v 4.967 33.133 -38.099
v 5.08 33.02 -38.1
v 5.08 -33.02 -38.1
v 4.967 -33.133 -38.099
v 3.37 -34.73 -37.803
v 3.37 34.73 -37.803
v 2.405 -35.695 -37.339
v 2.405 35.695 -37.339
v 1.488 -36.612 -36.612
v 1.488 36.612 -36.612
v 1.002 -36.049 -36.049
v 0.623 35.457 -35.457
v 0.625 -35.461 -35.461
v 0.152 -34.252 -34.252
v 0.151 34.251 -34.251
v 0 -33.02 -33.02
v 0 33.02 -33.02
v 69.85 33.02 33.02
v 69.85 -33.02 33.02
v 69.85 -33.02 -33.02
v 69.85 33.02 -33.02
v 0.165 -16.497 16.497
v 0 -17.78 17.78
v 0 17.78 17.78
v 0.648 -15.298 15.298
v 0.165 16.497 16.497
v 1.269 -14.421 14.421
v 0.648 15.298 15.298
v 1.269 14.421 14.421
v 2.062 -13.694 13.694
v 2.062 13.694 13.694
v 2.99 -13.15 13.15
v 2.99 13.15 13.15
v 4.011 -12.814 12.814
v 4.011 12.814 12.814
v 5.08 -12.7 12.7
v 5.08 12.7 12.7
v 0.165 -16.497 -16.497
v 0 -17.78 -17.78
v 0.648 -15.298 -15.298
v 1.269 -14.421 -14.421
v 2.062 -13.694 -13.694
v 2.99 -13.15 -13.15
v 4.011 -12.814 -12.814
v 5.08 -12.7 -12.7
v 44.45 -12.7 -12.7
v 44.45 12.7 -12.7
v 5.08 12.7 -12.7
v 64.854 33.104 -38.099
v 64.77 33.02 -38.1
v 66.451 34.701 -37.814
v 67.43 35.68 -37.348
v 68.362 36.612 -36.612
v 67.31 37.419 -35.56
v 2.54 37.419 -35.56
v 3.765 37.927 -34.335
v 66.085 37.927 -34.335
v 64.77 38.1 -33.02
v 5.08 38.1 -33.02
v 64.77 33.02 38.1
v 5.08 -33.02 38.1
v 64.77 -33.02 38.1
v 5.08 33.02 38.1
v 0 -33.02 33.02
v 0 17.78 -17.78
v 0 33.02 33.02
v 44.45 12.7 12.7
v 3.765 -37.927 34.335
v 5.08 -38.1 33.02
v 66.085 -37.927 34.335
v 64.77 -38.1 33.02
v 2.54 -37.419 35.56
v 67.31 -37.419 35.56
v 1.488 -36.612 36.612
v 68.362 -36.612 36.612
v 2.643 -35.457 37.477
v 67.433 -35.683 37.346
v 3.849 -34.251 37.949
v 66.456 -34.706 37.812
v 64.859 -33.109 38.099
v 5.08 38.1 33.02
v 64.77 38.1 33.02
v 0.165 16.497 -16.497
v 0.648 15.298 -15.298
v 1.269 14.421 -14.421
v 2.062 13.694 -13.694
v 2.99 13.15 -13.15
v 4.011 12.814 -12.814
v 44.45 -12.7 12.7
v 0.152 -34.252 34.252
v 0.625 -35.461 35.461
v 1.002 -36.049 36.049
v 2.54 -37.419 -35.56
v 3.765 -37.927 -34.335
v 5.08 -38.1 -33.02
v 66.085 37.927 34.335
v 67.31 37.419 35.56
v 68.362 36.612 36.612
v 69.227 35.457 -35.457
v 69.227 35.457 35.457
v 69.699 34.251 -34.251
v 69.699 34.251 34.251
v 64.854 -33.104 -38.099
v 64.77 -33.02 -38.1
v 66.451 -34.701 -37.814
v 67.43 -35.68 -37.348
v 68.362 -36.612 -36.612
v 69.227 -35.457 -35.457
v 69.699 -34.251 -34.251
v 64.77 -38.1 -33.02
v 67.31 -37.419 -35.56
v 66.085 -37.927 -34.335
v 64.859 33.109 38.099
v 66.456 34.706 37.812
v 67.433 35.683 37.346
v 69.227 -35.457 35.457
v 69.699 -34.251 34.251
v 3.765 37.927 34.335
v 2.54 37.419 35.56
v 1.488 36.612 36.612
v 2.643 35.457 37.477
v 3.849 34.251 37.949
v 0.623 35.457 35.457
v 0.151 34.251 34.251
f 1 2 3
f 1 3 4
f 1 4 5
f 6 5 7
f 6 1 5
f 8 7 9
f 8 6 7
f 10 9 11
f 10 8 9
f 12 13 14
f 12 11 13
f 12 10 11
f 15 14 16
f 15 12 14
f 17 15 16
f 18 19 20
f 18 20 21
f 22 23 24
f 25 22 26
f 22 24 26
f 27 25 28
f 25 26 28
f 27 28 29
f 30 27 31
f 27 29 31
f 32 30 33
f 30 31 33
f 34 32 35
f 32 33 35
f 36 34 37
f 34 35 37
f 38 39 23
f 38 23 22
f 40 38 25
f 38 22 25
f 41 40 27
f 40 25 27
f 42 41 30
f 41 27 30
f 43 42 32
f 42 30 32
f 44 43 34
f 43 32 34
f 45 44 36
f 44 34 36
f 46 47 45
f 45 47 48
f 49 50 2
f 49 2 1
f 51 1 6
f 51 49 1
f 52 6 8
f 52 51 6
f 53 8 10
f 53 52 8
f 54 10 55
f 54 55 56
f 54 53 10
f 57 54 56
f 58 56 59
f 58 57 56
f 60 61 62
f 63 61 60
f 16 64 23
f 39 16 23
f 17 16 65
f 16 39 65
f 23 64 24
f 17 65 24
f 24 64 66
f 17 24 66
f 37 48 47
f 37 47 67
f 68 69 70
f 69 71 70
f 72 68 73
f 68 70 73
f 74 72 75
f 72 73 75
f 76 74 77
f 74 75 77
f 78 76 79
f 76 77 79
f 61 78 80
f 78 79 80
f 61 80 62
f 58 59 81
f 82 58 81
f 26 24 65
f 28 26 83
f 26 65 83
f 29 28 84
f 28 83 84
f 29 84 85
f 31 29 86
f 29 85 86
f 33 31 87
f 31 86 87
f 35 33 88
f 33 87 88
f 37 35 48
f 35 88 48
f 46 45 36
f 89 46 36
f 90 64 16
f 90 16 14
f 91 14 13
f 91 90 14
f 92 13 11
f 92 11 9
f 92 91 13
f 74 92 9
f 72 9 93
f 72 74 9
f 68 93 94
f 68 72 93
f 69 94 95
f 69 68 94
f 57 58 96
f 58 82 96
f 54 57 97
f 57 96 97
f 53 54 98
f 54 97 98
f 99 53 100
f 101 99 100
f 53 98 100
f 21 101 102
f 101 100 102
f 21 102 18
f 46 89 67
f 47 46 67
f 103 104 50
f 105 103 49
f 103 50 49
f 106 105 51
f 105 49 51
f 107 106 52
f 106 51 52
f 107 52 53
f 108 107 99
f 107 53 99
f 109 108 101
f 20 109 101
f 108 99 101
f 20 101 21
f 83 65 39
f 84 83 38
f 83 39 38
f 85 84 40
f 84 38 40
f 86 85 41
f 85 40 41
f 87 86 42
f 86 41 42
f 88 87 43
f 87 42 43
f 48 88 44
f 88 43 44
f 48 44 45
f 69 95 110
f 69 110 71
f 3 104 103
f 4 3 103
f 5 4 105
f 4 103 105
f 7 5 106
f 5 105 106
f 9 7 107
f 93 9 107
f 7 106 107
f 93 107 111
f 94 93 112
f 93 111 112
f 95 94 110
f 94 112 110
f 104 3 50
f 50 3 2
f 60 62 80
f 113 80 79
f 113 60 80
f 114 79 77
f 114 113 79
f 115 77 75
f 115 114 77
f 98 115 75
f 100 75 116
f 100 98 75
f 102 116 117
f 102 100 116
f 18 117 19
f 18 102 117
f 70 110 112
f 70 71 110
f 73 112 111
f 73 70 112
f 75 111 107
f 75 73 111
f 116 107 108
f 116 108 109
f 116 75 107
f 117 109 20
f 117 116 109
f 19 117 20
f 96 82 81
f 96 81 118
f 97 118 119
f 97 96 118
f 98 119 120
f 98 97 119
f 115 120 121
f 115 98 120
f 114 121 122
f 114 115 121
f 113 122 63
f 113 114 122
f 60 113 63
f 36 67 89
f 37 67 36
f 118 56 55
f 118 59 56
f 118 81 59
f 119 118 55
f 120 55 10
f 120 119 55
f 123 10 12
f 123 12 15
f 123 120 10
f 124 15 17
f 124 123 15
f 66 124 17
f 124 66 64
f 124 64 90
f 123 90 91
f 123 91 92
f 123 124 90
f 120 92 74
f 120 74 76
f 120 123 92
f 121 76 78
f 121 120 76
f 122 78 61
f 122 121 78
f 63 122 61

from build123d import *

# Parameters (mm, degrees)
F0_W         = 76.2
F0_H         = 76.2
F1_DEPTH     = 69.85
F2_T         = -25.4
F3_R         = 5.08
F4_R         = 5.08
F5_T1_DEPTH  = 91.44
F5_T3_DEPTH  = 25.4
F5_T5_DEPTH  = 25.4
F5_T11_DEPTH = 38.1
F5_T15_DEPTH = 38.1
F5_T22_DEPTH = 38.1
F5_T26_DEPTH = 38.1
F5_T33_DEPTH = 38.1
F5_T37_DEPTH = 38.1
F5_T44_DEPTH = 38.1
F5_T48_DEPTH = 38.1
F6_T1_DEPTH  = 91.44


# Not quite as in the source:
# - a fillet or chamfer that OpenCascade refuses, or shapes differently, is made with other operations: its cross-section is extruded or revolved along the edge and cut away or added


with BuildPart() as f1:
    # F0 (on Right) → F1 (new body)
    with BuildSketch(Plane.YZ):
        Rectangle(F0_W, F0_H)
    extrude(amount=F1_DEPTH)

    # F2
    f2_openings = [f1.faces().sort_by_distance(p)[0] for p in [
        (0, 0, 0),
    ]]
    offset(amount=F2_T, openings=f2_openings)

    # F3
    f3_edges = [f1.edges().sort_by_distance(p)[0] for p in [
        (34.925, 38.1, -38.1),
        (34.925, 38.1, 38.1),
        (0, 38.1, 0),
        (69.85, 38.1, 0),
    ]]
    fillet(f3_edges, radius=F3_R)

    # F4
    f4_edges = [f1.edges().sort_by_distance(p)[0] for p in [
        (34.925, -38.1, 38.1),
        (34.925, -38.1, -38.1),
        (0, -38.1, 0),
        (69.85, -38.1, 0),
    ]]
    fillet(f4_edges, radius=F4_R)

    # F5: fillet of radius 5.08 on 8 edges, made by hand

    # F5_s2 → F5_t1 (cut)
    with BuildSketch(Plane.XZ.offset(-45.72)):
        with BuildLine():
            ThreePointArc((5.08, -38.1), (1.4878975516, -36.6121024484), (0, -33.02))
            Line((0, -33.02), (0, -38.1))
            Line((0, -38.1), (5.08, -38.1))
        make_face()
        with BuildLine():
            ThreePointArc((0, 33.02), (1.4878975516, 36.6121024484), (5.08, 38.1))
            Line((5.08, 38.1), (0, 38.1))
            Line((0, 38.1), (0, 33.02))
        make_face()
    extrude(amount=F5_T1_DEPTH, mode=Mode.SUBTRACT)

    # F5_s4 → F5_t3 (cut)
    with BuildSketch(Plane.XY.offset(-12.7)):
        with BuildLine():
            ThreePointArc((0, -17.78), (1.4878975516, -14.1878975516), (5.08, -12.7))
            Line((5.08, -12.7), (0, -12.7))
            Line((0, -12.7), (0, -17.78))
        make_face()
        with BuildLine():
            ThreePointArc((0, 17.78), (1.4878975516, 14.1878975516), (5.08, 12.7))
            Line((5.08, 12.7), (0, 12.7))
            Line((0, 12.7), (0, 17.78))
        make_face()
    extrude(amount=F5_T3_DEPTH, mode=Mode.SUBTRACT)

    # F5_s6 → F5_t5 (cut)
    with BuildSketch(Plane.XZ.offset(-12.7)):
        with BuildLine():
            ThreePointArc((0, 17.78), (1.4878975516, 14.1878975516), (5.08, 12.7))
            Line((5.08, 12.7), (0, 12.7))
            Line((0, 12.7), (0, 17.78))
        make_face()
        with BuildLine():
            ThreePointArc((0, -17.78), (1.4878975516, -14.1878975516), (5.08, -12.7))
            Line((5.08, -12.7), (0, -12.7))
            Line((0, -12.7), (0, -17.78))
        make_face()
    extrude(amount=F5_T5_DEPTH, mode=Mode.SUBTRACT)


with BuildPart() as f5_tool9:
    # F5_s10 → F5_t11 (new body)
    with BuildSketch(Plane.XY.offset(25.4)):
        with BuildLine():
            ThreePointArc((0, -17.78), (1.4878975516, -14.1878975516), (5.08, -12.7))
            Line((5.08, -12.7), (0, -12.7))
            Line((0, -12.7), (0, -17.78))
        make_face()
    extrude(amount=-F5_T11_DEPTH)

    split(bisect_by=Plane.XY.offset(12.7), keep=Keep.TOP)


with BuildPart() as f5_tool13:
    # F5_s14 → F5_t15 (new body)
    with BuildSketch(Plane.XZ.offset(-12.7)):
        with BuildLine():
            ThreePointArc((0, 17.78), (1.4878975516, 14.1878975516), (5.08, 12.7))
            Line((5.08, 12.7), (0, 12.7))
            Line((0, 12.7), (0, 17.78))
        make_face()
    extrude(amount=F5_T15_DEPTH)

    split(bisect_by=Plane.XZ.offset(12.7), keep=Keep.TOP)


with BuildPart() as f5_tool9_1:
    add(f5_tool9.part)

    # F5_t17: intersect F5_tool13
    add(f5_tool13.part, mode=Mode.INTERSECT)


with BuildPart() as f1_1:
    add(f1.part)

    # F5_t7: cut F5_tool9
    add(f5_tool9_1.part, mode=Mode.SUBTRACT)


with BuildPart() as f5_tool20:
    # F5_s21 → F5_t22 (new body)
    with BuildSketch(Plane.XY.offset(12.7)):
        with BuildLine():
            ThreePointArc((0, -17.78), (1.4878975516, -14.1878975516), (5.08, -12.7))
            Line((5.08, -12.7), (0, -12.7))
            Line((0, -12.7), (0, -17.78))
        make_face()
    extrude(amount=-F5_T22_DEPTH)

    split(bisect_by=Plane.XY.offset(-12.7), keep=Keep.BOTTOM)


with BuildPart() as f5_tool24:
    # F5_s25 → F5_t26 (new body)
    with BuildSketch(Plane.XZ.offset(25.4)):
        with BuildLine():
            ThreePointArc((0, -17.78), (1.4878975516, -14.1878975516), (5.08, -12.7))
            Line((5.08, -12.7), (0, -12.7))
            Line((0, -12.7), (0, -17.78))
        make_face()
    extrude(amount=-F5_T26_DEPTH)

    split(bisect_by=Plane.XZ.offset(12.7), keep=Keep.TOP)


with BuildPart() as f5_tool20_1:
    add(f5_tool20.part)

    # F5_t28: intersect F5_tool24
    add(f5_tool24.part, mode=Mode.INTERSECT)


with BuildPart() as f1_2:
    add(f1_1.part)

    # F5_t18: cut F5_tool20
    add(f5_tool20_1.part, mode=Mode.SUBTRACT)


with BuildPart() as f5_tool31:
    # F5_s32 → F5_t33 (new body)
    with BuildSketch(Plane.XZ.offset(-25.4)):
        with BuildLine():
            ThreePointArc((0, 17.78), (1.4878975516, 14.1878975516), (5.08, 12.7))
            Line((5.08, 12.7), (0, 12.7))
            Line((0, 12.7), (0, 17.78))
        make_face()
    extrude(amount=F5_T33_DEPTH)

    split(bisect_by=Plane.XZ.offset(-12.7), keep=Keep.BOTTOM)


with BuildPart() as f5_tool35:
    # F5_s36 → F5_t37 (new body)
    with BuildSketch(Plane.XY.offset(-12.7)):
        with BuildLine():
            ThreePointArc((0, 17.78), (1.4878975516, 14.1878975516), (5.08, 12.7))
            Line((5.08, 12.7), (0, 12.7))
            Line((0, 12.7), (0, 17.78))
        make_face()
    extrude(amount=F5_T37_DEPTH)

    split(bisect_by=Plane.XY.offset(12.7), keep=Keep.TOP)


with BuildPart() as f5_tool31_1:
    add(f5_tool31.part)

    # F5_t39: intersect F5_tool35
    add(f5_tool35.part, mode=Mode.INTERSECT)


with BuildPart() as f1_3:
    add(f1_2.part)

    # F5_t29: cut F5_tool31
    add(f5_tool31_1.part, mode=Mode.SUBTRACT)


with BuildPart() as f5_tool42:
    # F5_s43 → F5_t44 (new body)
    with BuildSketch(Plane.XY.offset(-25.4)):
        with BuildLine():
            ThreePointArc((0, 17.78), (1.4878975516, 14.1878975516), (5.08, 12.7))
            Line((5.08, 12.7), (0, 12.7))
            Line((0, 12.7), (0, 17.78))
        make_face()
    extrude(amount=F5_T44_DEPTH)

    split(bisect_by=Plane.XY.offset(-12.7), keep=Keep.BOTTOM)


with BuildPart() as f5_tool46:
    # F5_s47 → F5_t48 (new body)
    with BuildSketch(Plane.XZ.offset(12.7)):
        with BuildLine():
            ThreePointArc((0, -17.78), (1.4878975516, -14.1878975516), (5.08, -12.7))
            Line((5.08, -12.7), (0, -12.7))
            Line((0, -12.7), (0, -17.78))
        make_face()
    extrude(amount=-F5_T48_DEPTH)

    split(bisect_by=Plane.XZ.offset(-12.7), keep=Keep.BOTTOM)


with BuildPart() as f5_tool42_1:
    add(f5_tool42.part)

    # F5_t50: intersect F5_tool46
    add(f5_tool46.part, mode=Mode.INTERSECT)


with BuildPart() as f1_4:
    add(f1_3.part)

    # F5_t40: cut F5_tool42
    add(f5_tool42_1.part, mode=Mode.SUBTRACT)

    # F6: fillet of radius 5.08 on 4 edges, made by hand

    # F6_s2 → F6_t1 (cut)
    with BuildSketch(Plane.XZ.offset(-45.72)):
        with BuildLine():
            ThreePointArc((64.77, -38.1), (68.3621024484, -36.6121024484), (69.85, -33.02))
            Line((69.85, -33.02), (69.85, -38.1))
            Line((69.85, -38.1), (64.77, -38.1))
        make_face()
        with BuildLine():
            ThreePointArc((64.77, 38.1), (68.3621024484, 36.6121024484), (69.85, 33.02))
            Line((69.85, 33.02), (69.85, 38.1))
            Line((69.85, 38.1), (64.77, 38.1))
        make_face()
    extrude(amount=F6_T1_DEPTH, mode=Mode.SUBTRACT)


solid = f1_4.part
